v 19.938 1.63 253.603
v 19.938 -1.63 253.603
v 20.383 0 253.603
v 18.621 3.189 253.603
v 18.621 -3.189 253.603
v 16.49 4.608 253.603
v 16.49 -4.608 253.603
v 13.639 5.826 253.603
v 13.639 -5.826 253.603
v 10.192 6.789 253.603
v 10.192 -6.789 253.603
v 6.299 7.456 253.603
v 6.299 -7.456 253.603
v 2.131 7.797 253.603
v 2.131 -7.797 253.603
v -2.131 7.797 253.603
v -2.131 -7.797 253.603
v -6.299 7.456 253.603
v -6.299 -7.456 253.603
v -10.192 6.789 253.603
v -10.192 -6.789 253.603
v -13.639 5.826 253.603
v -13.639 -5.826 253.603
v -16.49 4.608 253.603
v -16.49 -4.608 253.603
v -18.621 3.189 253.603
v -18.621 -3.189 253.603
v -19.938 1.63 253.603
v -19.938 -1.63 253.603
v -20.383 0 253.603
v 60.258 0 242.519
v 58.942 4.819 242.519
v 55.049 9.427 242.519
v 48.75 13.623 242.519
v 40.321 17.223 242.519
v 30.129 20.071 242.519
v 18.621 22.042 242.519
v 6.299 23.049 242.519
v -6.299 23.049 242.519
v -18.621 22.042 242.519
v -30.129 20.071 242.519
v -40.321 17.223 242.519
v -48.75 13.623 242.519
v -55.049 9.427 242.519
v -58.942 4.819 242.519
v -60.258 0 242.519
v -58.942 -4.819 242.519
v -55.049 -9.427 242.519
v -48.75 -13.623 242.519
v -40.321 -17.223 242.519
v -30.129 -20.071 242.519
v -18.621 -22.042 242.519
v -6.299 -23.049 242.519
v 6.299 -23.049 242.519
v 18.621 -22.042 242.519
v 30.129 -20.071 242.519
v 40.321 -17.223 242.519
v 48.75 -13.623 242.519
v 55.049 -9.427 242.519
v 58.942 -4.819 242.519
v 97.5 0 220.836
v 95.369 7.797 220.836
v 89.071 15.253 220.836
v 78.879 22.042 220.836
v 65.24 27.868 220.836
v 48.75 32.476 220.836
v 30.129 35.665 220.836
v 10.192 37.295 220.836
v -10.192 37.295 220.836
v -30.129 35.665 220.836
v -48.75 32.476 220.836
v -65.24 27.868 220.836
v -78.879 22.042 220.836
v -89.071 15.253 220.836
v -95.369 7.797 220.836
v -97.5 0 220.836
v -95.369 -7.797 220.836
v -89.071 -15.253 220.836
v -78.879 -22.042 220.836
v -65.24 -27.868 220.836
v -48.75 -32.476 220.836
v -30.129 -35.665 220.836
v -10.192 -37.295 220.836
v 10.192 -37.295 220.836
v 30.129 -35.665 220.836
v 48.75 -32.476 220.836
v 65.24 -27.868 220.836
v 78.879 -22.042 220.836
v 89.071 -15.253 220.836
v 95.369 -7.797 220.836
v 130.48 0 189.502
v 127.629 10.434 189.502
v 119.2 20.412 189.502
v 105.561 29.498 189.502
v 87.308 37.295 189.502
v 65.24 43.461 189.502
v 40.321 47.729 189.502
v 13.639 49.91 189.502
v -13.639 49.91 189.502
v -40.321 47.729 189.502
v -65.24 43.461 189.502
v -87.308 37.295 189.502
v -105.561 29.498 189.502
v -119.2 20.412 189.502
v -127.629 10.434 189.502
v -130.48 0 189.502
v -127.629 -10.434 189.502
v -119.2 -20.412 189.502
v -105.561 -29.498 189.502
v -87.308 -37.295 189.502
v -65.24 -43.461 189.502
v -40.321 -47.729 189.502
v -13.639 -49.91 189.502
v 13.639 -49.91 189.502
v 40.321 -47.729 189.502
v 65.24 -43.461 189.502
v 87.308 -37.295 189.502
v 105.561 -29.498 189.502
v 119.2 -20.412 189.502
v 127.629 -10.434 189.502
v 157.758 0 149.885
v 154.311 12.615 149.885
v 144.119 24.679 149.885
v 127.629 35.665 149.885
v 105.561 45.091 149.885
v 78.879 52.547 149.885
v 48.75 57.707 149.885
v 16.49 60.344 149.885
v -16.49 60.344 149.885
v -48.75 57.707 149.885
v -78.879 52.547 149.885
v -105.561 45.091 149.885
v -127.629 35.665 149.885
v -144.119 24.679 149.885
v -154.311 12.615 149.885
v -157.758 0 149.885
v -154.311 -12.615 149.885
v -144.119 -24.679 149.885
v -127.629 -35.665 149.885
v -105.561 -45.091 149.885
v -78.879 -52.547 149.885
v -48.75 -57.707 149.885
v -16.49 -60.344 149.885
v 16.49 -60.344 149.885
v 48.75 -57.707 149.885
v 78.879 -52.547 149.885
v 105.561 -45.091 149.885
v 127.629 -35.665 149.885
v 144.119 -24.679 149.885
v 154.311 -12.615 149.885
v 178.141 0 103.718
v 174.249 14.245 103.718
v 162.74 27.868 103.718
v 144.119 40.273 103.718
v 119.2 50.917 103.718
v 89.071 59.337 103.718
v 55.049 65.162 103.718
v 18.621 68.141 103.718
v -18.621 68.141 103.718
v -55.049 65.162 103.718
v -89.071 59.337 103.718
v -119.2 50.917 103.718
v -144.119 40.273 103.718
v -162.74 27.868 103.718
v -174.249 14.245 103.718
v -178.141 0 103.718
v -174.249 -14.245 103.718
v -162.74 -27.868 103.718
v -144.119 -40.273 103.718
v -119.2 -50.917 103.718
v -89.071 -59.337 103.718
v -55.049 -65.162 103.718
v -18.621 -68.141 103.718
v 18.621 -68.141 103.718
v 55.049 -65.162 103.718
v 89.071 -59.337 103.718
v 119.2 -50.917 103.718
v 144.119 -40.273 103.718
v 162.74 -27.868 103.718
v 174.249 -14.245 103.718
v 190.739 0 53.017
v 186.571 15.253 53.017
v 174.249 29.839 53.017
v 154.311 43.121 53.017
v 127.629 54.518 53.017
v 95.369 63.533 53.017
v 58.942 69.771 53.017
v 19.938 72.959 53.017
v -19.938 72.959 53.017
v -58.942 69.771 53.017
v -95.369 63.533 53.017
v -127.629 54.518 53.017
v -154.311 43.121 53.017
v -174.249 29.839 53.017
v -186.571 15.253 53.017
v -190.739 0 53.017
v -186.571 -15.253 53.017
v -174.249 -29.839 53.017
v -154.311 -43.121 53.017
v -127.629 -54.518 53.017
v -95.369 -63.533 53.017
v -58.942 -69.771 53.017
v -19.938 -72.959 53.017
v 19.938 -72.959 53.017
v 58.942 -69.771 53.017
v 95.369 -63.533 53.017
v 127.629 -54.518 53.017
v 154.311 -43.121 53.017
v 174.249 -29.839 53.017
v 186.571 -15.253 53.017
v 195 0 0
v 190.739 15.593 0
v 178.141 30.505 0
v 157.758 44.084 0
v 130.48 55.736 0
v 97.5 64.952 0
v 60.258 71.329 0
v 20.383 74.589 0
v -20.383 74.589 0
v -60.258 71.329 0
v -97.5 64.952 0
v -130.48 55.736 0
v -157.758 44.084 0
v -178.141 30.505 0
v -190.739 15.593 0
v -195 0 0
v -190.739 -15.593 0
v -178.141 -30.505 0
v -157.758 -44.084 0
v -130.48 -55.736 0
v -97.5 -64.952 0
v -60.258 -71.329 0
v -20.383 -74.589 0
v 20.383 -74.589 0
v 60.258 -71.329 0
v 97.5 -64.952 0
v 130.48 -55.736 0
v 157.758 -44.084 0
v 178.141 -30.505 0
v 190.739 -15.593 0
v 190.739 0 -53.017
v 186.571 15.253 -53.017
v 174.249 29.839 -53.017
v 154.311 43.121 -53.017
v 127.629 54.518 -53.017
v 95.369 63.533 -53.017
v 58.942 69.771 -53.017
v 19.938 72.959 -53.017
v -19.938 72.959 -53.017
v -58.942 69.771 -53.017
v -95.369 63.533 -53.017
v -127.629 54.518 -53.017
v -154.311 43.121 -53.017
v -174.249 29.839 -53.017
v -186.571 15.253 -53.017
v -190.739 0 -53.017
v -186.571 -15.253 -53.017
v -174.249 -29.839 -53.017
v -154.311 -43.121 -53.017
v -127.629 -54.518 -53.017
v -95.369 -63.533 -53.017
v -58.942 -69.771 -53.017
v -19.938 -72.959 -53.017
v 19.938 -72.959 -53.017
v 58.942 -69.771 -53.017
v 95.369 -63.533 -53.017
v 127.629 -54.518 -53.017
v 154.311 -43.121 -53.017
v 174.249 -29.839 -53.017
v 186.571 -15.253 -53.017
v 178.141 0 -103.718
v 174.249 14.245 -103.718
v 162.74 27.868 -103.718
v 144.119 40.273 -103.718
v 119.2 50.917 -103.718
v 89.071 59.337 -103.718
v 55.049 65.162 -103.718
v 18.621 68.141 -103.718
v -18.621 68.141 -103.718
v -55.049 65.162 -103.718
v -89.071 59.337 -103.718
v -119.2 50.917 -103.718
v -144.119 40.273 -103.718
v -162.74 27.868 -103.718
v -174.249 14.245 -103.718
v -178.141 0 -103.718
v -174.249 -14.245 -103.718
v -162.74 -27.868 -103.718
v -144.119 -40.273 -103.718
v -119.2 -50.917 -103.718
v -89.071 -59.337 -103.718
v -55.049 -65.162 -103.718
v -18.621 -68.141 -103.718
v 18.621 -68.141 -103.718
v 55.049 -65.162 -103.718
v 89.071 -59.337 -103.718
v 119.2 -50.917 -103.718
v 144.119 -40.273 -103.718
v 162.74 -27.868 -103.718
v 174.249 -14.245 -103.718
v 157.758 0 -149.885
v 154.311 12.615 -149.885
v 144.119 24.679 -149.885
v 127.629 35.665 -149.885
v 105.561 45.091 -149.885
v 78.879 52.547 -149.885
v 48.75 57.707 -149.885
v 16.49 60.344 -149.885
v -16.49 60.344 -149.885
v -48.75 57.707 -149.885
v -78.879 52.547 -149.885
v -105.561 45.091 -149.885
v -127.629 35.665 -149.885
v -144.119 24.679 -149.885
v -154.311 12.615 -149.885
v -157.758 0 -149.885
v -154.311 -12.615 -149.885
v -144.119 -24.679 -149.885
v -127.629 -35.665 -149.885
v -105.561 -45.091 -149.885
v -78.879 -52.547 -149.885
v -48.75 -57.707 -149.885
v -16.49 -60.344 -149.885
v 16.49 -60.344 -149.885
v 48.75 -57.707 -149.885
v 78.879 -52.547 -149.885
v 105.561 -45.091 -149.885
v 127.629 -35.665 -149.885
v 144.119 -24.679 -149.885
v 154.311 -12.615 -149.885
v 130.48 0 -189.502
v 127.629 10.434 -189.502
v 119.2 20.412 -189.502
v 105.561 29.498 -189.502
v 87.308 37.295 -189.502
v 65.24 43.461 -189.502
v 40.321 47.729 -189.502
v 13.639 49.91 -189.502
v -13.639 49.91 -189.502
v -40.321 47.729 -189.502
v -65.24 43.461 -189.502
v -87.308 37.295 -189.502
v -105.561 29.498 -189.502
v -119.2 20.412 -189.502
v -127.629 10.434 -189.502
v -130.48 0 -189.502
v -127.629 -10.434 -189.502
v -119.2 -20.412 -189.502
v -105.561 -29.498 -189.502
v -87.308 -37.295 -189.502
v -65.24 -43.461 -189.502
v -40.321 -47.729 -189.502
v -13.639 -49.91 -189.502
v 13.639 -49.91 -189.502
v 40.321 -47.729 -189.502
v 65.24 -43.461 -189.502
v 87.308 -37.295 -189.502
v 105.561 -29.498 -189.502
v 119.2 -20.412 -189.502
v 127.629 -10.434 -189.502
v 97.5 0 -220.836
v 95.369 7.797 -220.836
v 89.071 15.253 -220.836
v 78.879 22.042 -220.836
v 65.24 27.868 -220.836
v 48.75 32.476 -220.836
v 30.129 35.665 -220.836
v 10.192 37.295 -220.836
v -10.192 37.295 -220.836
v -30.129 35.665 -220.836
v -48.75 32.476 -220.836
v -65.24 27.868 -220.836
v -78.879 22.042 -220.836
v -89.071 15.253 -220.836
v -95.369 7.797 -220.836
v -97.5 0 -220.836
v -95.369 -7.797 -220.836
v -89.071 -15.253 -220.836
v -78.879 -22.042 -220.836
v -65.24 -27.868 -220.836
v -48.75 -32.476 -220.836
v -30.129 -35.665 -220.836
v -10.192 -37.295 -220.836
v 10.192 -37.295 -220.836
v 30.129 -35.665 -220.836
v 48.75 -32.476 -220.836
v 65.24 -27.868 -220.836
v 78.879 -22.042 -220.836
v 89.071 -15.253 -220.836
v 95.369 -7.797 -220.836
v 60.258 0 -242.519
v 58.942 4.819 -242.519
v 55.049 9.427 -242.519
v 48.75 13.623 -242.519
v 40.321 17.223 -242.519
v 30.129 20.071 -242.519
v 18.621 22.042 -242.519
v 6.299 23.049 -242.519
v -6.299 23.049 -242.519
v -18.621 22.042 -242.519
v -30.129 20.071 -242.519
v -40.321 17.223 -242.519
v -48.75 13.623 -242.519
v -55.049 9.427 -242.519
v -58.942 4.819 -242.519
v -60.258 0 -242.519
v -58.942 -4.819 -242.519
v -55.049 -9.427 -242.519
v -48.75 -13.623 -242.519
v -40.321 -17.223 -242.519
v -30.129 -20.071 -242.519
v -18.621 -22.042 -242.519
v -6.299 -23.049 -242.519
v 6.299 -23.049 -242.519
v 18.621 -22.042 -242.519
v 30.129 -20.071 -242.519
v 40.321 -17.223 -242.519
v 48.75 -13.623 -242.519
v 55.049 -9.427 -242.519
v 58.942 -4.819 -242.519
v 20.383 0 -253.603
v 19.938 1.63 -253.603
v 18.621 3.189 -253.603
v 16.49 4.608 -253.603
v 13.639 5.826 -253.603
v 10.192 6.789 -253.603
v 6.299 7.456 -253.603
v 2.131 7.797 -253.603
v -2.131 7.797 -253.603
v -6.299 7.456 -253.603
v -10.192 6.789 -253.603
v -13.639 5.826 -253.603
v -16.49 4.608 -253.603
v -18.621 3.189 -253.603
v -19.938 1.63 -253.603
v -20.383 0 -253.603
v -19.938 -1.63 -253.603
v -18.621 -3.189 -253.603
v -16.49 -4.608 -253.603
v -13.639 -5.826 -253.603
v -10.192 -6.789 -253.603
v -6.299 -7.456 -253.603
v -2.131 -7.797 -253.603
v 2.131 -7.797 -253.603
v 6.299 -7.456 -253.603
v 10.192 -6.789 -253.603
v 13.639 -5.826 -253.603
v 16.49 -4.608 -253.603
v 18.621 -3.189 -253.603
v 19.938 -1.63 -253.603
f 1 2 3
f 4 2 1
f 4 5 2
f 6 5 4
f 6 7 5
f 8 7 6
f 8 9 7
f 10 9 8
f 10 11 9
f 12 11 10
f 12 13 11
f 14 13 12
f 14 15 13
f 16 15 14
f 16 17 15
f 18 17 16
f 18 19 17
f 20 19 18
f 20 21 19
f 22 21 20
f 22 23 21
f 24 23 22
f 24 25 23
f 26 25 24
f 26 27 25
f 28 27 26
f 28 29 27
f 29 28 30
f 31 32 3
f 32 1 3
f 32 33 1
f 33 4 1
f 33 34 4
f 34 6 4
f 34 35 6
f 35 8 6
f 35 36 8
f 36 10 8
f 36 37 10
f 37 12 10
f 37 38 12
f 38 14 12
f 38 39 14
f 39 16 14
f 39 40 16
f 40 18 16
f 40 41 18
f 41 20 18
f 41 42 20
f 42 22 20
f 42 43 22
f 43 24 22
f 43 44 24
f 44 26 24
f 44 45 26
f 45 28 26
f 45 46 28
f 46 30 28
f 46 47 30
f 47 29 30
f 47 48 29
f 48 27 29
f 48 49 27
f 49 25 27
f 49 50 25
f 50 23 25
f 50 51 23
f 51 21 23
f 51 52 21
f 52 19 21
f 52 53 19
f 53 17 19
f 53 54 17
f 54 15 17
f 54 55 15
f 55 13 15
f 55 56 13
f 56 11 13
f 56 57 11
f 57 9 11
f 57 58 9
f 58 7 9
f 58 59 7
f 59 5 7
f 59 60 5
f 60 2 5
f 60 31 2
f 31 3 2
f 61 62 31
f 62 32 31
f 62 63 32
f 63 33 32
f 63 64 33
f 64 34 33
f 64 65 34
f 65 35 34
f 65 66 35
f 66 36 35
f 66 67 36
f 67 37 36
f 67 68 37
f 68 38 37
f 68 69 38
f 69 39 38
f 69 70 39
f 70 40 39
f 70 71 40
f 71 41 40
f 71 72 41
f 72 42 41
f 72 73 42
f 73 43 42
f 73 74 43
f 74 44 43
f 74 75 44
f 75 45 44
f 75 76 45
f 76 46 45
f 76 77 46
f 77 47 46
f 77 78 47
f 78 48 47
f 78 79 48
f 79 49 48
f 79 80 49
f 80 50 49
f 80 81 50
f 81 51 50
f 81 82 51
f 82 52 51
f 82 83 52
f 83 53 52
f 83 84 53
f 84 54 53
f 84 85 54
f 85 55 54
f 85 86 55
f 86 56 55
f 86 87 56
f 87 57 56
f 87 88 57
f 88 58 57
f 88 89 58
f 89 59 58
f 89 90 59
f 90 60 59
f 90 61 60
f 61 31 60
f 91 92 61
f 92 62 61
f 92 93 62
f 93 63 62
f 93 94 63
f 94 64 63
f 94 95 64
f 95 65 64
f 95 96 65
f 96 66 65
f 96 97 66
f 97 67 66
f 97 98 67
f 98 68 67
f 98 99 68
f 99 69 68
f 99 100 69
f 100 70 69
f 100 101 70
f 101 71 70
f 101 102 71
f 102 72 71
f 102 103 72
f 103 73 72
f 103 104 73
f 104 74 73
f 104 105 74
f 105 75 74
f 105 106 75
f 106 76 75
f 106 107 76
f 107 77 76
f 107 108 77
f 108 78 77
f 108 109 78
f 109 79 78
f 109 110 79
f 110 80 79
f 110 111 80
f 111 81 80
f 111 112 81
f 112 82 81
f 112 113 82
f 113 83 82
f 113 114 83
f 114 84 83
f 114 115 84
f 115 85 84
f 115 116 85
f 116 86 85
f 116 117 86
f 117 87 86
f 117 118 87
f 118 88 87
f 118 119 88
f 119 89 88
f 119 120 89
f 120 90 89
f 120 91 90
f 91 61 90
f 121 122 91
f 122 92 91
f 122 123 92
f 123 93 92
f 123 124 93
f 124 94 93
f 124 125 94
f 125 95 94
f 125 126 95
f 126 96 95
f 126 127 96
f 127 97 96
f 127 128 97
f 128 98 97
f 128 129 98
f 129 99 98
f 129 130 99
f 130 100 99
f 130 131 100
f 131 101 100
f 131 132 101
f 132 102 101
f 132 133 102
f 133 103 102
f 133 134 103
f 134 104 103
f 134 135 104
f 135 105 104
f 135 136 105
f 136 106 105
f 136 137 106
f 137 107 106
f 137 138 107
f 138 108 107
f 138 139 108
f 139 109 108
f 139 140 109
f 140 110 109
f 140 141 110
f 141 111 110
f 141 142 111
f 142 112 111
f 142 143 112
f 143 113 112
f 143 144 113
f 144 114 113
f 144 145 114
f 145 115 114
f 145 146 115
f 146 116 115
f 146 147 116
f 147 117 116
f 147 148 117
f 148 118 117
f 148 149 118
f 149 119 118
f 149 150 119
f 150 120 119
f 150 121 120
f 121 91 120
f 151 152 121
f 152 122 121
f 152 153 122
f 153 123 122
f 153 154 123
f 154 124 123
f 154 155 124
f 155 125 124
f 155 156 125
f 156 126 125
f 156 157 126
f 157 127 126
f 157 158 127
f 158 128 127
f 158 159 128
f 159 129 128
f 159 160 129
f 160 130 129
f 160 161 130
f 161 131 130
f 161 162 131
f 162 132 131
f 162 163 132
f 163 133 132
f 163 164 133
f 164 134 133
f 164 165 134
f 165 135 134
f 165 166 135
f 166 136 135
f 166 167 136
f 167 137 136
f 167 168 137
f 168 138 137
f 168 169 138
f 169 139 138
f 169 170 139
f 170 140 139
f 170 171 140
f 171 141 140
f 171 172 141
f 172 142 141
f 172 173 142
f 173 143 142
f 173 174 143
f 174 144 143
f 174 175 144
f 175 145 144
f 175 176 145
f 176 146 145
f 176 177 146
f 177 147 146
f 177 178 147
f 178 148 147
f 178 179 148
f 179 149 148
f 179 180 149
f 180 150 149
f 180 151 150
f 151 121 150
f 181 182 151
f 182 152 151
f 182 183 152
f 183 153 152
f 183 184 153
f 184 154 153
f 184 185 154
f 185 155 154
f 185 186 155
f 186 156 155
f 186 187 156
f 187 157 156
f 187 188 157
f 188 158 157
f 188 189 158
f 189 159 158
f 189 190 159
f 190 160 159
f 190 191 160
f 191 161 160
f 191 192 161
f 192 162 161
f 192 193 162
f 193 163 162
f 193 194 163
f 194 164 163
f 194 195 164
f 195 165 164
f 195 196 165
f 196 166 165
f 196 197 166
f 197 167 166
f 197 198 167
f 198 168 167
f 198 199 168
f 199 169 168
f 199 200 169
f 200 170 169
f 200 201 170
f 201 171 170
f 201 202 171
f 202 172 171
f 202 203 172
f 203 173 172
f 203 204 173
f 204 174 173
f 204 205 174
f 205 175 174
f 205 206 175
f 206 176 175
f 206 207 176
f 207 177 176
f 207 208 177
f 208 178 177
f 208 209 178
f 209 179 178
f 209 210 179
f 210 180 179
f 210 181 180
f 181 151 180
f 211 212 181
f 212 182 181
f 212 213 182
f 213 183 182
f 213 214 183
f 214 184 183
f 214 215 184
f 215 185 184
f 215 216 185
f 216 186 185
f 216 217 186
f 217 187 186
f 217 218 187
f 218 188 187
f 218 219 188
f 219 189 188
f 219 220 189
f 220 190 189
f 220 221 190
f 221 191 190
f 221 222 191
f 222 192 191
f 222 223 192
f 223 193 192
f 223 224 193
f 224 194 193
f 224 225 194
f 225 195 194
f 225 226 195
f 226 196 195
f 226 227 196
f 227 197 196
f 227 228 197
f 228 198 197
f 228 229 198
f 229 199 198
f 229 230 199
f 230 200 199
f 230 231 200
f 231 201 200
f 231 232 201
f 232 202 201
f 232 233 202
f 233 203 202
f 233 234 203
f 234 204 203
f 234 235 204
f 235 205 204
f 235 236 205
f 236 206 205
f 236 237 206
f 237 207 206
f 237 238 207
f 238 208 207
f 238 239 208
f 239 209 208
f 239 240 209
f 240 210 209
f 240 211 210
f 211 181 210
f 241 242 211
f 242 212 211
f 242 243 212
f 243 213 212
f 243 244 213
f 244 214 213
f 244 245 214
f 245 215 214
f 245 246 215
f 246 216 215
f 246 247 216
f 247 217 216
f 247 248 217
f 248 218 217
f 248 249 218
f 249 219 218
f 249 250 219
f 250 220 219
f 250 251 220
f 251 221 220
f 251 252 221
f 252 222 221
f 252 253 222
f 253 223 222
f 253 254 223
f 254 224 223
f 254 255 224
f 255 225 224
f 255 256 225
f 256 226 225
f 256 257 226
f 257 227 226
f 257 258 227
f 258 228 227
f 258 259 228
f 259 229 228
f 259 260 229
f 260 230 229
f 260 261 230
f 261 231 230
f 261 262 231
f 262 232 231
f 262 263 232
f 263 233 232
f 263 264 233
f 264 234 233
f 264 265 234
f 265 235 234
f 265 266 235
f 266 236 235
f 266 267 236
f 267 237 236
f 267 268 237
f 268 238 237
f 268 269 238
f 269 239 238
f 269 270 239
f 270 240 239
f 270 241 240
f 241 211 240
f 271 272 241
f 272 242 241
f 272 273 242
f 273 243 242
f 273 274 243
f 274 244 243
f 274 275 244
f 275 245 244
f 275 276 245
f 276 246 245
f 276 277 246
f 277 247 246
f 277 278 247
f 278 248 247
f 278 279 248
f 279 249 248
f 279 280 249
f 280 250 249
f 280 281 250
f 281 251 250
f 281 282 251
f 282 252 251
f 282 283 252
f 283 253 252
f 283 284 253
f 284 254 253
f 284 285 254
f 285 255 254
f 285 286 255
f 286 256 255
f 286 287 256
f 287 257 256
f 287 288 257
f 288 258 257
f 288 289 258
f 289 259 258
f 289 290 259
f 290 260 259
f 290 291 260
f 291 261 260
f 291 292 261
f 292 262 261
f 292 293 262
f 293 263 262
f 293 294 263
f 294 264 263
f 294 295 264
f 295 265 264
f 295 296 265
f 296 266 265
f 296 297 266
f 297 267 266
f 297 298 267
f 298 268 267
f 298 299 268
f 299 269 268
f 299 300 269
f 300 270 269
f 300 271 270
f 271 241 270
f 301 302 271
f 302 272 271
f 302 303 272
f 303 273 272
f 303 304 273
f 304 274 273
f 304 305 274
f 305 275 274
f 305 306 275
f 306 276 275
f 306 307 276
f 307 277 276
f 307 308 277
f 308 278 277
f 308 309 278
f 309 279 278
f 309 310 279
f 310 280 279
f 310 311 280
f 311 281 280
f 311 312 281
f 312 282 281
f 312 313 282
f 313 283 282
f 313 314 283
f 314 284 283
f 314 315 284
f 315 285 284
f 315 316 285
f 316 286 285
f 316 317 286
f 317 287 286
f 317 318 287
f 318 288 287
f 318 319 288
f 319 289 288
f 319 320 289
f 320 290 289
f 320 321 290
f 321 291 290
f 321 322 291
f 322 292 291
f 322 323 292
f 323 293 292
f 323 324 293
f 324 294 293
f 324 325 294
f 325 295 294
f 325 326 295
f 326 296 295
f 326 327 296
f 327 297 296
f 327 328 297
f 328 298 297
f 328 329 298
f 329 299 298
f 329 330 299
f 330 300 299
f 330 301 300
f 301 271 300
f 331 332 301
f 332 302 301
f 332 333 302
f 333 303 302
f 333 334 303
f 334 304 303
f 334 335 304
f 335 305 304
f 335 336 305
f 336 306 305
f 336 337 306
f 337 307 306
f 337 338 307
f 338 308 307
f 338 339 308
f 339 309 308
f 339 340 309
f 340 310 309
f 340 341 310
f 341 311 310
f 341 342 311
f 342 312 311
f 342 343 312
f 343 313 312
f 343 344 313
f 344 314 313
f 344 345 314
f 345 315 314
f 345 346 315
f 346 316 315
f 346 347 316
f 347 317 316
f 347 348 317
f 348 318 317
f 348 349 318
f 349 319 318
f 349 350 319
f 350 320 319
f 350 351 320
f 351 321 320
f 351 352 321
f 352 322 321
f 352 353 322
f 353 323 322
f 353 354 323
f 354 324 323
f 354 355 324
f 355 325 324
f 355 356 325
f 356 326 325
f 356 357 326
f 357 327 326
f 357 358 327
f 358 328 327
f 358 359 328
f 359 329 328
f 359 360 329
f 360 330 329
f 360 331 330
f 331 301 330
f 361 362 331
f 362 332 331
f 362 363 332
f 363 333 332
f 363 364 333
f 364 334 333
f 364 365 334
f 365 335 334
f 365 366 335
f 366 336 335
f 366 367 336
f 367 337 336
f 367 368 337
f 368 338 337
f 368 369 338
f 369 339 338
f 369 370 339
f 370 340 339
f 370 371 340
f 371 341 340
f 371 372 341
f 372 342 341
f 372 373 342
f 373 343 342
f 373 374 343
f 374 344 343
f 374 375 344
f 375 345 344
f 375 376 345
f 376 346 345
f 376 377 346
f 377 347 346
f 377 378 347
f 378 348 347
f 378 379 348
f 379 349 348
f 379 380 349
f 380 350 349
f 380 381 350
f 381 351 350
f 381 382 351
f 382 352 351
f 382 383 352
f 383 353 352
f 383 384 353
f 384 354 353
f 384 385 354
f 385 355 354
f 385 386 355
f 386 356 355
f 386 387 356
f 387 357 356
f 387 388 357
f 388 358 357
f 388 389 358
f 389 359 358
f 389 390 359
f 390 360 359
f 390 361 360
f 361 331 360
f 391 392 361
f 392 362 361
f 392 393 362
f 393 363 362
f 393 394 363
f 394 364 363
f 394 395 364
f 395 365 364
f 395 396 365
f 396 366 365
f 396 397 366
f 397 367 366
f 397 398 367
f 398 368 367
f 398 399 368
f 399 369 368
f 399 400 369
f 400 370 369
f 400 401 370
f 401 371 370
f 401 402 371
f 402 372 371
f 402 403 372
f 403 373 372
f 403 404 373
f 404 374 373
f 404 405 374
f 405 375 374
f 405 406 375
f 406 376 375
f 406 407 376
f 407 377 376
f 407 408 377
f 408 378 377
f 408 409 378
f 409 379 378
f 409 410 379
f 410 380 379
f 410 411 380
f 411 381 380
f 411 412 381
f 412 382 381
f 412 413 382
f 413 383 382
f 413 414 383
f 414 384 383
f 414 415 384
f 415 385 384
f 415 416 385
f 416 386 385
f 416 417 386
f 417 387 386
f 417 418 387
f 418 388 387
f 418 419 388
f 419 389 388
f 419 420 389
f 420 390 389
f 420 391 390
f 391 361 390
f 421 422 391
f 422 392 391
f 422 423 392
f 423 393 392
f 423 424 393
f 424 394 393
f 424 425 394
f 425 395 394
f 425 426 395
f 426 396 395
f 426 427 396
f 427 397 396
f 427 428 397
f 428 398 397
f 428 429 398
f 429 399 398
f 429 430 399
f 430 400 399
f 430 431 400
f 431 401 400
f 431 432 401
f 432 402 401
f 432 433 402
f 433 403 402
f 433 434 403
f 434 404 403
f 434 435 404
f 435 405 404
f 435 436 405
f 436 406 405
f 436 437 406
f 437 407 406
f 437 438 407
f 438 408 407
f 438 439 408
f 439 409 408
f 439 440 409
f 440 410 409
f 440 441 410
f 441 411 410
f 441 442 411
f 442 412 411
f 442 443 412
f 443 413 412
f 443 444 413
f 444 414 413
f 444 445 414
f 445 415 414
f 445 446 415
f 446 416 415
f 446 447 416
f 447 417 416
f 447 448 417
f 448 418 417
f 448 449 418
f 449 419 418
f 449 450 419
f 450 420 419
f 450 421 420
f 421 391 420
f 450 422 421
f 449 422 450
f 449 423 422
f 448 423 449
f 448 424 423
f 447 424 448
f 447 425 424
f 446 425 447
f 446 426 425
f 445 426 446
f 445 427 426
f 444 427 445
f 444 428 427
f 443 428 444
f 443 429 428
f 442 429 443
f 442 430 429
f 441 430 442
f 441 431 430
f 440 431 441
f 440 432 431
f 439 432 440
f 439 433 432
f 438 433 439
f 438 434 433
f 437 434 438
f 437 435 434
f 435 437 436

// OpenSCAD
// Generated by SolidPython 1.0.1 on 2020-07-29 00:46:50


scale(v = [13, 5, 17]) {
	sphere(r = 15);
}
/***********************************************
*********      SolidPython code:      **********
************************************************
 
# import packages: SolidPython
from solid import *
from solid.utils import *
from itertools import chain, combinations, permutations


class Resize:

    def __init__(self, scad_file):
        self.scad_file = scad_file
        #self.scad_file = import_scad(scad_file)
        # cone/cylinder param:
        self.r1 = 0
        self.r2 = 0
        self.h = 0
        # rectangular prism param:
        self.w = 0
        self.l = 0
        # ellipse param:
        self.r = 0

    # import OpenScad code (file name corresponds to shape)


    # classify shape + parameters
    def assign(self, param1, param2, param3):
        if self.scad_file == 'cone.scad':
            self.r1 = param1
            self.r2 = param2
            self.h = param3
        elif self.scad_file == 'cylinder.scad':
            self.r1 = param1
            self.r2 = param2
            self.h = param3
        elif self.scad_file == 'rectangularPrism.scad':
            self.h = param1
            self.l = param2
            self.w = param3
        else:
            self.r = param1
            self.h = param2

    # resize parameters
    def iterate(self):
        x = range(3, 20, 2)
        i = 1
        if self.scad_file == 'cone.scad':
            tempList = list(permutations(x, 2))
            for temp in tempList:
                param1 = temp[0]
                param2 = temp[1]
                filepath = 'produced_scad_files/' + 'cone' + str(param1) + '_' + str(param2) + '_' + '.scad'
                scad_render_to_file(cylinder(h=param1, r1=param2, r2=0), filepath)

        elif self.scad_file == 'cylinder.scad':
            tempList = list(permutations(x, 3))
            for temp in tempList:
                param1 = temp[0]
                param2 = temp[1]
                filepath = 'produced_scad_files/' + 'cylinder' + str(param1) + '_' + str(param2) + '_' + '.scad'
                scad_render_to_file(cylinder(h=param1, r1=param2, r2=param2), filepath)

        elif self.scad_file == 'rectangularPrism.scad':
            tempList = list(permutations(x, 3))
            for temp in tempList:
                param1 = temp[0]
                param2 = temp[1]
                param3 = temp[2]
                filepath = 'produced_scad_files/' + 'rectangularPrism' + str(param1) + '_' + str(param2) + '_' + str(
                    param3) + '.scad'
                scad_render_to_file(cube(size=(param1, param2, param3)), filepath)

        elif self.scad_file == 'ellipse.scad':
            tempList = list(permutations(x, 4))
            for temp in tempList:
                param1 = temp[0]
                param2 = temp[1]
                param3 = temp[2]
                param4 = temp[3]
                filepath = 'produced_scad_files/' + 'ellipse' + str(param1) + '_' + str(param2) + '_' + str(param3) + '_' + str(param4) + '.scad'
                scad_render_to_file(scale([param1, param2, param3])(sphere(r=param4)), filepath)

    def render_to_scadfile(self):
        scad_render_to_file(scad, 'example.scad') 
 
************************************************/
